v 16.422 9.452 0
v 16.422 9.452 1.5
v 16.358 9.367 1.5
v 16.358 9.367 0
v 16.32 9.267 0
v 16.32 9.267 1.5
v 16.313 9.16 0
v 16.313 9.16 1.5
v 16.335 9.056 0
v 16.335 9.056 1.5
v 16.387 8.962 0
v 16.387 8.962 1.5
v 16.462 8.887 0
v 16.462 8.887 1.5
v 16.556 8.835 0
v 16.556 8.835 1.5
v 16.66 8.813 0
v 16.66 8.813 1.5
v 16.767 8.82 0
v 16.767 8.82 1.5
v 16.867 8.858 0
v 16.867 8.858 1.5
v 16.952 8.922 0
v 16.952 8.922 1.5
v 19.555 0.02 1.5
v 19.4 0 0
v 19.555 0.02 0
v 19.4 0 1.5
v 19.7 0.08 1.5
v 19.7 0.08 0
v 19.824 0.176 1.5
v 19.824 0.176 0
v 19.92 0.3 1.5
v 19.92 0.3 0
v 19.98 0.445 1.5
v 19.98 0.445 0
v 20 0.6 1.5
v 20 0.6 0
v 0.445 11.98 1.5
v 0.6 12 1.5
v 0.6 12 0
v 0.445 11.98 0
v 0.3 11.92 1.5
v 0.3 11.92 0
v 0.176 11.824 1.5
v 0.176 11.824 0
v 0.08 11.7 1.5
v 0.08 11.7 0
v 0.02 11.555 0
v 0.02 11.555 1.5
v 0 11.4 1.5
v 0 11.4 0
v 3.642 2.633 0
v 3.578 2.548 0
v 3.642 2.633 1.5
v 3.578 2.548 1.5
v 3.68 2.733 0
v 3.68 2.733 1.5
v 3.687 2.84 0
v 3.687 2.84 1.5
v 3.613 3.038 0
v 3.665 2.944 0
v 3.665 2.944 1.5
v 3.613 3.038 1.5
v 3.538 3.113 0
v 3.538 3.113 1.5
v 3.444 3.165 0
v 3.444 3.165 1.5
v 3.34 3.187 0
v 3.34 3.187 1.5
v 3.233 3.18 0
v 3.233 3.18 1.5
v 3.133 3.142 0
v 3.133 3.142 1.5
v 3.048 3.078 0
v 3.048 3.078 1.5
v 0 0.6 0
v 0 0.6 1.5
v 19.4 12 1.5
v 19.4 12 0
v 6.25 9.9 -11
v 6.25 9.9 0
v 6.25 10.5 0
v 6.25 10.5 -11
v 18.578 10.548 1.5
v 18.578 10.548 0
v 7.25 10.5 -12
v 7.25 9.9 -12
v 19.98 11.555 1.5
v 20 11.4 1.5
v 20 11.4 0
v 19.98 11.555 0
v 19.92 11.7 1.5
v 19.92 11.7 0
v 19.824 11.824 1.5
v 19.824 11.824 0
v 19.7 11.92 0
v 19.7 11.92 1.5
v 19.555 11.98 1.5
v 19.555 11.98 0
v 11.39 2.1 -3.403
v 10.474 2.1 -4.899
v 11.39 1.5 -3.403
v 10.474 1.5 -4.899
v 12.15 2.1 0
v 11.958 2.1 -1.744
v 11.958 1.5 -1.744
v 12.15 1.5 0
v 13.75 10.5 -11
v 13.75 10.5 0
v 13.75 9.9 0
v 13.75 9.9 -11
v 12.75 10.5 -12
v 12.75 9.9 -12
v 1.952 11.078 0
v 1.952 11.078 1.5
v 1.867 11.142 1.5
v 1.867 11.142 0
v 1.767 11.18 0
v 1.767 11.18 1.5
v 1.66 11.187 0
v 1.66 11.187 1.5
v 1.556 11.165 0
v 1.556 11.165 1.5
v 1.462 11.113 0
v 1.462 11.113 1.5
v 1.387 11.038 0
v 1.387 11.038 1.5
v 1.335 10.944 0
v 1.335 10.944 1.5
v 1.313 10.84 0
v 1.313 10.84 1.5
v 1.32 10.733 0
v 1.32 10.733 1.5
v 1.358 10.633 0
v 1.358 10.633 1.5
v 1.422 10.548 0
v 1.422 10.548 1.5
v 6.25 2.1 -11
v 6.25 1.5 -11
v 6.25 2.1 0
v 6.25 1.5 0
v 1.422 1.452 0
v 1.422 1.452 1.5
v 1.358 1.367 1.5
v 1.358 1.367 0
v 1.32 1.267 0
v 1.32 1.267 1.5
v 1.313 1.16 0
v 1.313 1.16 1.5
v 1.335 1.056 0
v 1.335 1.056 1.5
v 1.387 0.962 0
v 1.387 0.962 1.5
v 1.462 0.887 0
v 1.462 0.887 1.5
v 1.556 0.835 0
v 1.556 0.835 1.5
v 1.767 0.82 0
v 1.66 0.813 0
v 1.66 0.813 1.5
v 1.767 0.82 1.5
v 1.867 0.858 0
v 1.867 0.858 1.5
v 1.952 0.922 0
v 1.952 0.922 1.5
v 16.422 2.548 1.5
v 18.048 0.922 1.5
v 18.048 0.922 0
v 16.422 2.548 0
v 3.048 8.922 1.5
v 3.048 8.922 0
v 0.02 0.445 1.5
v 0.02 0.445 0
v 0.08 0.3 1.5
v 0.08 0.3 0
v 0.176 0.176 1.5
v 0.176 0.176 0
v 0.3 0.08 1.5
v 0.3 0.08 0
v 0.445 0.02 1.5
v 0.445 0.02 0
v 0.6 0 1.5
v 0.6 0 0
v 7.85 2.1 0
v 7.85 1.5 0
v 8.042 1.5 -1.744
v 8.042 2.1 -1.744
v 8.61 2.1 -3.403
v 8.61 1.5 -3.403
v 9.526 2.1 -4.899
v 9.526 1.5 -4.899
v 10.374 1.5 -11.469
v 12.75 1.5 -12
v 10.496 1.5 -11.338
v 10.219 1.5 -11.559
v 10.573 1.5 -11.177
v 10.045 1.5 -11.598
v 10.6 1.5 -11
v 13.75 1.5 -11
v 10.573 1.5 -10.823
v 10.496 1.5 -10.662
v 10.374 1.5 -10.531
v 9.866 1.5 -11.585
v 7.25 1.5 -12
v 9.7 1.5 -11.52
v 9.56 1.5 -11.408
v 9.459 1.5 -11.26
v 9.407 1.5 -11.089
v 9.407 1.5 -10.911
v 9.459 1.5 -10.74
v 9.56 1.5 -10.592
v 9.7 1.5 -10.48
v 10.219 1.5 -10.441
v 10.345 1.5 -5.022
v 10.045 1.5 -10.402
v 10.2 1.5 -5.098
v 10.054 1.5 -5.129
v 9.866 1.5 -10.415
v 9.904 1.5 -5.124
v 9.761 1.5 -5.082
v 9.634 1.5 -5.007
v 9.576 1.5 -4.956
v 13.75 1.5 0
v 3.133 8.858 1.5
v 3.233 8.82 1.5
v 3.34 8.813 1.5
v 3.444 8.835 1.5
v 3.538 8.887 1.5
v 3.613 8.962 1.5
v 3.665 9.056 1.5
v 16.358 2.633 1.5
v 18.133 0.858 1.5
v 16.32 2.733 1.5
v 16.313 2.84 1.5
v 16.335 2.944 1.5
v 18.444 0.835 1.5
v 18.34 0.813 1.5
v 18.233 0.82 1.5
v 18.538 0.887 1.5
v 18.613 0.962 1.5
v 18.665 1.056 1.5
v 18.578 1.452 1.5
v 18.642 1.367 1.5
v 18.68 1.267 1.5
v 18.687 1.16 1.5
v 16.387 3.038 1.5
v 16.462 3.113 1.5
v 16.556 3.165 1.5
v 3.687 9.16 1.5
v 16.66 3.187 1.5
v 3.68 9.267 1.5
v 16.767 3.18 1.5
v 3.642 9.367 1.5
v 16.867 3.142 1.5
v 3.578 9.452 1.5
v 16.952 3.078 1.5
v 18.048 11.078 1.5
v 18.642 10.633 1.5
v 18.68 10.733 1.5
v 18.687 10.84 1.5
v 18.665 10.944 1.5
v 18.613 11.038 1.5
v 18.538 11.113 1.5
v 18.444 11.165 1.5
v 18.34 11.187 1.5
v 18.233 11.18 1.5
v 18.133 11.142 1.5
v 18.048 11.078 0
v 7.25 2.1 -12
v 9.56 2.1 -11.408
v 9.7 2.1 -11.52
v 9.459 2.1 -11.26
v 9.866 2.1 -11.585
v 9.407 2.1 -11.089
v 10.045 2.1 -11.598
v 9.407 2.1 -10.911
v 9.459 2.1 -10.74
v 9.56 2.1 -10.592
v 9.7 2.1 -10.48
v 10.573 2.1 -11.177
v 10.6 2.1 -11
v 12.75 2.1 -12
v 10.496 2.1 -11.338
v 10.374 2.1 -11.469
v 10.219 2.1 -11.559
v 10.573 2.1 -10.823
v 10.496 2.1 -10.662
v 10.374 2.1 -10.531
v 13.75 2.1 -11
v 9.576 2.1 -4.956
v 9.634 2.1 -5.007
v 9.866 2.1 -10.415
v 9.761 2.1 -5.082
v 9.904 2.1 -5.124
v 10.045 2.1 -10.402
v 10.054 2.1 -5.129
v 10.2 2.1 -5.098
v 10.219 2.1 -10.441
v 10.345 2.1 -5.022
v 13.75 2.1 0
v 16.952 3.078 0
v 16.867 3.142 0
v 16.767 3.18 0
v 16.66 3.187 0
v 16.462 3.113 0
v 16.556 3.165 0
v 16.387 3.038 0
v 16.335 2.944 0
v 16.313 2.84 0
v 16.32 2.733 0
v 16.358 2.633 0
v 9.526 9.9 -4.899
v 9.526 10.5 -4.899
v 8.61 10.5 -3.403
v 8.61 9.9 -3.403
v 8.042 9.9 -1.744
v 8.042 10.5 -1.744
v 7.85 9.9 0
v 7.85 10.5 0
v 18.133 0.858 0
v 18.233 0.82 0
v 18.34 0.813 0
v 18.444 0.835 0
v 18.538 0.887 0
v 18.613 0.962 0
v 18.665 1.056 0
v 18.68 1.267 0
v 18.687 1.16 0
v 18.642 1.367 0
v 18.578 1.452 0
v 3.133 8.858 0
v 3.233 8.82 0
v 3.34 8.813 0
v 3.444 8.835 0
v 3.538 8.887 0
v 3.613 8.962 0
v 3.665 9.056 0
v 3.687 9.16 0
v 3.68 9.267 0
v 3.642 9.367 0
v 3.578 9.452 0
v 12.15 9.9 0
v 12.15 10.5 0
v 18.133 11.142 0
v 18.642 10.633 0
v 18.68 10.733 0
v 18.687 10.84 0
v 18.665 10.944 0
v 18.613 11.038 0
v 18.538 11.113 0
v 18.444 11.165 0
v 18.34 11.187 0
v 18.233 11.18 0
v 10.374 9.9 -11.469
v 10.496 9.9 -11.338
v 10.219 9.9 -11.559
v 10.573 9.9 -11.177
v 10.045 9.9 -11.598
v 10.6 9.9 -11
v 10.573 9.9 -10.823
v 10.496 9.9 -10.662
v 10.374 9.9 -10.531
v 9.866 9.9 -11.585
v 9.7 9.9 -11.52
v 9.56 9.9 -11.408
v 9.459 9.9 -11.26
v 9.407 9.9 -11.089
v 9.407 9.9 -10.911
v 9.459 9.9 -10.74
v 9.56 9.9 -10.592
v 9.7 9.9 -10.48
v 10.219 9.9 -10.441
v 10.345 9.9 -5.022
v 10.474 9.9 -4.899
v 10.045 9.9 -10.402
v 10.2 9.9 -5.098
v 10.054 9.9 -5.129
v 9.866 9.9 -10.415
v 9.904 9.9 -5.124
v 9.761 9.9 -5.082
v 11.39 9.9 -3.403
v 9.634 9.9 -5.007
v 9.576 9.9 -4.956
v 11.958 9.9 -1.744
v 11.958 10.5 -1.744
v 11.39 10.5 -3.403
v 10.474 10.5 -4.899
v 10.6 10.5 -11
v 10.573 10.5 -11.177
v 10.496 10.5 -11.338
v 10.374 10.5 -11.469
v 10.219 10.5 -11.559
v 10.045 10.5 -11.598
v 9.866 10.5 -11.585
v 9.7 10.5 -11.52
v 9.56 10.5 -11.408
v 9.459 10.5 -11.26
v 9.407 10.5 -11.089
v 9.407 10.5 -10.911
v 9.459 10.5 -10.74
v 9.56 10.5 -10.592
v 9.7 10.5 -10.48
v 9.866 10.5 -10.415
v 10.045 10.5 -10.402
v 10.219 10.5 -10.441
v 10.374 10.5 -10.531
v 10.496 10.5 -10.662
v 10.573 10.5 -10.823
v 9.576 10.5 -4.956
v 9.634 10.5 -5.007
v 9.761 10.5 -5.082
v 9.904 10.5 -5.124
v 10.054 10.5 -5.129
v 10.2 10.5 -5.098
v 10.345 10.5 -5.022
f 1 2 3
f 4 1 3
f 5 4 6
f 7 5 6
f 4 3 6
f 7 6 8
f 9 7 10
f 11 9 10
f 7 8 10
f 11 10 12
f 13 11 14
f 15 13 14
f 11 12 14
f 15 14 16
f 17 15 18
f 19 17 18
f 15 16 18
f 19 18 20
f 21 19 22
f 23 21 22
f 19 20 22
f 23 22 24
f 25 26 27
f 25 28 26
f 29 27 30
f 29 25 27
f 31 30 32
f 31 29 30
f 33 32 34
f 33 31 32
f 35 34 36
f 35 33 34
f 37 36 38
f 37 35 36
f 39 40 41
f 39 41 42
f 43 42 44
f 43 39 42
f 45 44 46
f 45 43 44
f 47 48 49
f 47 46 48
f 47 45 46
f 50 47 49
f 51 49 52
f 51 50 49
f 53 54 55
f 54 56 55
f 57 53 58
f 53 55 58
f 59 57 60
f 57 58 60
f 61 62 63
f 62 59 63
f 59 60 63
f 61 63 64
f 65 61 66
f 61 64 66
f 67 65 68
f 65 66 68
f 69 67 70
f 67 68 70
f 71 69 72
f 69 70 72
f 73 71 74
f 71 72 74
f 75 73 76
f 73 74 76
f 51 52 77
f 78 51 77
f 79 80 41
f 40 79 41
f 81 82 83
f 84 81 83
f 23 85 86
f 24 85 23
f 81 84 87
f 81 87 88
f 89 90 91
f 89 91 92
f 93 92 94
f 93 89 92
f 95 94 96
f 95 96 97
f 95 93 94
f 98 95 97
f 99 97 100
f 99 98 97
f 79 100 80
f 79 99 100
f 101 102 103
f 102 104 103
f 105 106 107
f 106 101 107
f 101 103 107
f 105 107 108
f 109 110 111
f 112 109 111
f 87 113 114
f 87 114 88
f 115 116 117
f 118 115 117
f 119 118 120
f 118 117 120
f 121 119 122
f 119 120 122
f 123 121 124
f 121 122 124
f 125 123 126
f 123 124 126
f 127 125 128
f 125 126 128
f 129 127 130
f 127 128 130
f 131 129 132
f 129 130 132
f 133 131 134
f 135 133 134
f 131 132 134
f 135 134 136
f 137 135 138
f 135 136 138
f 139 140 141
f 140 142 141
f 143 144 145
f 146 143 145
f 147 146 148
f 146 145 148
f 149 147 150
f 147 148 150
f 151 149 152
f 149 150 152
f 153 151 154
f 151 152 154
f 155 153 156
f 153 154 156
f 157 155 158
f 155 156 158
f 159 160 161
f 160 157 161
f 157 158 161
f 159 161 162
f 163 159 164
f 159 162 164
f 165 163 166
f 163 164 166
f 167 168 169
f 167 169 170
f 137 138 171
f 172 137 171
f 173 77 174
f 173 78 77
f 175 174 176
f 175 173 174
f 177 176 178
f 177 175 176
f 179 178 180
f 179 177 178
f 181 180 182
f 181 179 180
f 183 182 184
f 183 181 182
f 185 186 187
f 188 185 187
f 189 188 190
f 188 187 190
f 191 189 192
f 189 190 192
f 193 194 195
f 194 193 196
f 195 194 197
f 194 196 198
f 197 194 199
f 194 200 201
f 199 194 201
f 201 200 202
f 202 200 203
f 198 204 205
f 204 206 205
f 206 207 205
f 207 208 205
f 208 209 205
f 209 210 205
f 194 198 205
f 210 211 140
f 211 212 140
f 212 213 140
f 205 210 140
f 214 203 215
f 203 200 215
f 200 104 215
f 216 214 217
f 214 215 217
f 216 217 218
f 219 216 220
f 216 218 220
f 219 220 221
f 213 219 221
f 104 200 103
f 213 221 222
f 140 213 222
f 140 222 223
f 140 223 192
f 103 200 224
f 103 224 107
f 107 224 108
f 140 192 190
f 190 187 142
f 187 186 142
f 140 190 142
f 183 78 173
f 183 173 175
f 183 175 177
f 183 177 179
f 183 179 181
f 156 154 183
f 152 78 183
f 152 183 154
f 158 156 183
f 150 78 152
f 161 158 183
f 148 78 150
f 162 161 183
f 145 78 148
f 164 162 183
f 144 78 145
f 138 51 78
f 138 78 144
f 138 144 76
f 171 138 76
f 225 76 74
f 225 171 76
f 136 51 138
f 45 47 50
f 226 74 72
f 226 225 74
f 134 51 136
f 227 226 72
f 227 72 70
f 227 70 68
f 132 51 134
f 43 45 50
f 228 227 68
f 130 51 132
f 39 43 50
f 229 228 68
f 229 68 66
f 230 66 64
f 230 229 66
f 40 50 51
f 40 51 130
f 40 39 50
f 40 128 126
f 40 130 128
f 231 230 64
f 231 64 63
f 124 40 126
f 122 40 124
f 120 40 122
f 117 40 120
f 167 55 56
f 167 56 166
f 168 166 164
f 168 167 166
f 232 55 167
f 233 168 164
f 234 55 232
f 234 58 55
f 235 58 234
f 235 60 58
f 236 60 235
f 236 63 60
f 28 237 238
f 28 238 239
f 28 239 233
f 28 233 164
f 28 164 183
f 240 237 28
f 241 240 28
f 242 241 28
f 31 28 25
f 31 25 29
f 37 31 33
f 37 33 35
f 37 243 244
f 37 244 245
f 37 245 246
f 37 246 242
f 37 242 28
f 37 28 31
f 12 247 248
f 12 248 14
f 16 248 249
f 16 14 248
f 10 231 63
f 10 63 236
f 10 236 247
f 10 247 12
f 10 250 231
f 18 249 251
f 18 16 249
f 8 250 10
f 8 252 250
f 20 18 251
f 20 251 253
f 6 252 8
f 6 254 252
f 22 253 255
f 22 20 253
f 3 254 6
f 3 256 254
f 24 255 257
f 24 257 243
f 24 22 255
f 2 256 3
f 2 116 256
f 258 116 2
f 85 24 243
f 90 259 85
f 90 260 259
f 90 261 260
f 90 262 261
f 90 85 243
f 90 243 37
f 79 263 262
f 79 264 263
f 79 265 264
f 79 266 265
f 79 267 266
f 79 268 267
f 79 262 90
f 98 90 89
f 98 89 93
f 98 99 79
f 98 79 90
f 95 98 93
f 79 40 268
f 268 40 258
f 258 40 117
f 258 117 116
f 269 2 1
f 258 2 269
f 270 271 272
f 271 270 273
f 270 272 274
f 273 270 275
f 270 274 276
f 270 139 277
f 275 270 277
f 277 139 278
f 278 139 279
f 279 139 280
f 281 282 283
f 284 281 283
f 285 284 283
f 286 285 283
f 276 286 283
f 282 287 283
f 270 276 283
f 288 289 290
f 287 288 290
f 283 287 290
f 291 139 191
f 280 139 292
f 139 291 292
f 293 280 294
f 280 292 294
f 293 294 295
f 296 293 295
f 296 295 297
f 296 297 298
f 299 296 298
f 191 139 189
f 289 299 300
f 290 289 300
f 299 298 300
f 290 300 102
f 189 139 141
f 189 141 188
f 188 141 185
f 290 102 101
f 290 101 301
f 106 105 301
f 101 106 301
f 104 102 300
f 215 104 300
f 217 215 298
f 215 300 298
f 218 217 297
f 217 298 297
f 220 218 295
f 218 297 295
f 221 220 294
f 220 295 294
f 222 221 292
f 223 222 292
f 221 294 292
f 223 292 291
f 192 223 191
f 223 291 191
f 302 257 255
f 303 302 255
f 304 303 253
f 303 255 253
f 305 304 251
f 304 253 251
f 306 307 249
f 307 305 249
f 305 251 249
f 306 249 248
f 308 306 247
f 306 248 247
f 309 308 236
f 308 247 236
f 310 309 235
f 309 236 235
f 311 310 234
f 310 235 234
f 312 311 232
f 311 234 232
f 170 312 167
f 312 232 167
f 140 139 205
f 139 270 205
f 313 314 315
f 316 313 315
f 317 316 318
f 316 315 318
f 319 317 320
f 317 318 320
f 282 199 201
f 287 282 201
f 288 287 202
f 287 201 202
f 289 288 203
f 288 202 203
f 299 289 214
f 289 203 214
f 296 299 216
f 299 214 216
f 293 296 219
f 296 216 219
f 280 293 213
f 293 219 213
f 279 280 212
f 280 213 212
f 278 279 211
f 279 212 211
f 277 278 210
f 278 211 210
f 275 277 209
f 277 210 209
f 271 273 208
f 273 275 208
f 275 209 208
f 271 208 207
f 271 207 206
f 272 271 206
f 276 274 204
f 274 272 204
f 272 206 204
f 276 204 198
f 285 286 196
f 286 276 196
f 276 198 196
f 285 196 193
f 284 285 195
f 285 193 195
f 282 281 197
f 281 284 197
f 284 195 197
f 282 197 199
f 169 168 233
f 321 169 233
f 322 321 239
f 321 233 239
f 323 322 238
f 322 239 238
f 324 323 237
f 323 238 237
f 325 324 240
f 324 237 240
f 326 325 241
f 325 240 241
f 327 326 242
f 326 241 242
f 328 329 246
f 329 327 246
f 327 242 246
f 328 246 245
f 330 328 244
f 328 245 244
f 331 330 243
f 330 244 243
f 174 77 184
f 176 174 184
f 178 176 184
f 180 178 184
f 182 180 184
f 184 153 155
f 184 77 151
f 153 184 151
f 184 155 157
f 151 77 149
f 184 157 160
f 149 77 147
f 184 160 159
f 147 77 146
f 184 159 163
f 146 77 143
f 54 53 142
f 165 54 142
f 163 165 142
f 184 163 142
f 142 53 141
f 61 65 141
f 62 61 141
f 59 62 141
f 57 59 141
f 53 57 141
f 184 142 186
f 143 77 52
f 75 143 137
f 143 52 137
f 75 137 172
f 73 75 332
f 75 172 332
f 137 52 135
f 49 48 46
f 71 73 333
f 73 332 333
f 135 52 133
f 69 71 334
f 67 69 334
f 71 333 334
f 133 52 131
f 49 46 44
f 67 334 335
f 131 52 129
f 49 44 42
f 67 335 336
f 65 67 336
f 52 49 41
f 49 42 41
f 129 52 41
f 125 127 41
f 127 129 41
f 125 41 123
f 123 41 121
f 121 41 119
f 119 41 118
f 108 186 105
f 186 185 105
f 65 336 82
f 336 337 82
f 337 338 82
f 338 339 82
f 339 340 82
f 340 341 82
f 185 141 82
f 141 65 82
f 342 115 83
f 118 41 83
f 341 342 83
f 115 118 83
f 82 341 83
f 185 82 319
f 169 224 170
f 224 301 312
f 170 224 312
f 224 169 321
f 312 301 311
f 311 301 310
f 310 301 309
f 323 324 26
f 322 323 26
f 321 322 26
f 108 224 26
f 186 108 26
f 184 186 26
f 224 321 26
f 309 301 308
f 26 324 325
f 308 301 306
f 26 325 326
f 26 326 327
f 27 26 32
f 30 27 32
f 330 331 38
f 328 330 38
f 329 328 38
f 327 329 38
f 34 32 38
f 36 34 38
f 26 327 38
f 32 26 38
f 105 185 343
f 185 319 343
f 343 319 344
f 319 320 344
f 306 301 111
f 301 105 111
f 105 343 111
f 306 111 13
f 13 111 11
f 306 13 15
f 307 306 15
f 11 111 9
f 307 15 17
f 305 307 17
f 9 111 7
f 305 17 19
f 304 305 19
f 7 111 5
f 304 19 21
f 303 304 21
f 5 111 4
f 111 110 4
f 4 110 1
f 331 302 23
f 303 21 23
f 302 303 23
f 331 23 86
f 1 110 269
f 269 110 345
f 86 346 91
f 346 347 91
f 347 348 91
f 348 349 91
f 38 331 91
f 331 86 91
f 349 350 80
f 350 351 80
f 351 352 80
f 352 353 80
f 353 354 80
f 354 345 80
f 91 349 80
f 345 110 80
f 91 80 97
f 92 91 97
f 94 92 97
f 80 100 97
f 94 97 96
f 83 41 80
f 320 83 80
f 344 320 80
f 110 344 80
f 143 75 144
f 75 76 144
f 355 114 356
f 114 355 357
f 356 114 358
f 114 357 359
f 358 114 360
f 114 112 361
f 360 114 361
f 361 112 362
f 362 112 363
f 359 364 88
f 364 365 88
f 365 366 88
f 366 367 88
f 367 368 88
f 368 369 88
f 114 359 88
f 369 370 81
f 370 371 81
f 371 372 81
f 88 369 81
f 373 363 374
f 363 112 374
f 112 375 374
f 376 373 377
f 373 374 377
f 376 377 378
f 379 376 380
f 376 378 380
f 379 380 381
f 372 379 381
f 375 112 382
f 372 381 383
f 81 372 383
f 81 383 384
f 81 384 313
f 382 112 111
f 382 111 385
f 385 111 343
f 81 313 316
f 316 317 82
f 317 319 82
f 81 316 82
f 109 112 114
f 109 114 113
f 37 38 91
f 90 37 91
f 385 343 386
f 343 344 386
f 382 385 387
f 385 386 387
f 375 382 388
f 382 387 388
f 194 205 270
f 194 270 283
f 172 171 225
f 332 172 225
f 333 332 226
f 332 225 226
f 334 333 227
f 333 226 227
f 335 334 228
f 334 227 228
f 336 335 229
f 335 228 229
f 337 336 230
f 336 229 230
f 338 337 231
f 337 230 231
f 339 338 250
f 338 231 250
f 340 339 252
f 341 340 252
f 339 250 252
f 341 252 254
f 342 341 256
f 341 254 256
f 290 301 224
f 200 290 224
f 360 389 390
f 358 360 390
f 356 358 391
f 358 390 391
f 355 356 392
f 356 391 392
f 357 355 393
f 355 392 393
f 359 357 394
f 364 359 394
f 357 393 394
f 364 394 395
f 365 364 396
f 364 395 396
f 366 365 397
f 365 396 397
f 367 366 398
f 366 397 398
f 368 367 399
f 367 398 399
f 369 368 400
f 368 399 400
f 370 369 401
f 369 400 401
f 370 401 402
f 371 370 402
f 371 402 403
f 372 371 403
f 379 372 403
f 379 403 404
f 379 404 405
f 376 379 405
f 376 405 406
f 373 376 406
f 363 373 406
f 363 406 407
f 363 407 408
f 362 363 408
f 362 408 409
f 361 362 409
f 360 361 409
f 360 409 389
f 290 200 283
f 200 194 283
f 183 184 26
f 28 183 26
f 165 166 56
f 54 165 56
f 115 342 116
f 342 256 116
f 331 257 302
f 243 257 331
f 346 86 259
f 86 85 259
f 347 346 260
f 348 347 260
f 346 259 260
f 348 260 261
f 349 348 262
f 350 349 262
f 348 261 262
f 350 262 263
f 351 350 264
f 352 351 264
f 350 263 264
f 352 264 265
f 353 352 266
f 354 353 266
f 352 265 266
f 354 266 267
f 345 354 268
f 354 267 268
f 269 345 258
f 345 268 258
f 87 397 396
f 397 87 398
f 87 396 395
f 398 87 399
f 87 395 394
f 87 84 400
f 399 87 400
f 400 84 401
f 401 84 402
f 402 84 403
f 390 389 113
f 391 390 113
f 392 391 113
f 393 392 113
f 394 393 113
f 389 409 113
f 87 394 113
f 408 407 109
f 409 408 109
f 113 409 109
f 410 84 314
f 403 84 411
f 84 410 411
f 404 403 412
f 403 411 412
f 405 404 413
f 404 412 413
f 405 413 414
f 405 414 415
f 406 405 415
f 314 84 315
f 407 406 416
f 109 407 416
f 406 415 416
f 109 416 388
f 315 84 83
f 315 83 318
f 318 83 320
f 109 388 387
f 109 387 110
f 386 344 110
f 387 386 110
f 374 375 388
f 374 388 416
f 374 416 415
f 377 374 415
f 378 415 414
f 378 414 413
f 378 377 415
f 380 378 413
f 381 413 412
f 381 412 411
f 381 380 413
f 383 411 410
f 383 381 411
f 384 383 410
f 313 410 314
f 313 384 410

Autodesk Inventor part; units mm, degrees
ref_plane "YZ Plane" through (0, 0, 0) normal (1, 0, 0) x (0, 1, 0)
sketch "Skizze1" plane through (0, 0, 0) normal (0, 0, 1) x (1, 0, 0)
  line L0 (0, 0) -> (20, 0)
  line L1 (20, 0) -> (20, 12)
  line L2 (20, 12) -> (0, 12)
  line L3 (0, 12) -> (0, 0)
  point P0 (0, 6)
  dimension "d0" = 20
  dimension "d1" = 12
extrude "Extrusion1" add sketch "Skizze1" along normal blind 1.5
sketch "Skizze2" plane through (0, 0, 1.5) normal (0, 0, 1) x (1, 0, 0)
  line L0 (1.6868, 10.8132) -> (3.3132, 9.1868) construction
  line L1 (1.4217, 10.548) -> (3.048, 8.9217)
  line L2 (3.5783, 9.452) -> (1.952, 11.0783)
  arc A0 (1.952, 11.0783) -> (1.4217, 10.548) centre (1.6868, 10.8132) ccw
  arc A1 (3.048, 8.9217) -> (3.5783, 9.452) centre (3.3132, 9.1868) ccw
  line L3 (0, 12) -> (0, 0) projected
  line L4 (18.3132, 10.8132) -> (16.6868, 9.1868) construction
  line L5 (18.5783, 10.548) -> (16.952, 8.9217)
  line L6 (16.4217, 9.452) -> (18.048, 11.0783)
  arc A2 (18.5783, 10.548) -> (18.048, 11.0783) centre (18.3132, 10.8132) ccw
  arc A3 (16.4217, 9.452) -> (16.952, 8.9217) centre (16.6868, 9.1868) ccw
  line L7 (20, 0) -> (20, 12) projected
  line L8 (0, 0) -> (20, 0) projected
  line L9 (10, 0) -> (10, 12) construction
  line L10 (20, 12) -> (0, 12) projected
  point P0 (2.5, 10)
  point P1 (17.5, 10)
  dimension "d7" = 15
  dimension "d8" = 7.5
  dimension "d9" = 0.75
  dimension "d10" = 2
  dimension "d11" = 2.3
  dimension "d12" = 45
extrude "Extrusion2" cut sketch "Skizze2" against normal up to surface (1.5 mm away) contours A0 L2 A1 L1 | L5 A3 L6 A2
ref_plane "Arbeitsebene1" through (0, 6, 0) normal (0, 1, 0) x (-1, 0, 0)
mirror "Spiegeln1" about plane through (0, 6, 0) normal (0, 1, 0) of "Extrusion2"
sketch "Skizze3" plane through (0, 0, 0) normal (0, 0, -1) x (-1, 0, 0)
  line L0 (-20, 12) -> (0, 12) projected
  line L1 (-10, 12) -> (-10, 0) construction
  line L2 (0, 0) -> (-20, 0) projected
  line L3 (-6.25, 10.5) -> (-13.75, 10.5)
  line L4 (-13.75, 10.5) -> (-13.75, 9.9)
  line L5 (-13.75, 9.9) -> (-6.25, 9.9)
  line L6 (-6.25, 9.9) -> (-6.25, 10.5)
  dimension "d16" = 1.5
  dimension "d17" = 7.5
  dimension "d18" = 0.6
extrude "Extrusion3" add sketch "Skizze3" along normal blind 12
chamfer "Fasen1" distance 1 angle 45 2 edges at (13.75, 10.2, -12) (6.25, 10.2, -12)
sketch "Skizze4" plane through (6.25, 10.5, 0) normal (0, 1, 0) x (1, 0, 0)
  line L0 (7.5, 0) -> (0, 0) projected
  line L1 (3.75, 0) -> (3.75, 5.4569) construction
  arc A0 (5.9, 0) -> (3.75, 5.4569) centre (-2.1, 0) ccw
  arc A1 (3.75, 5.4569) -> (1.6, 0) centre (9.6, 0) ccw
  line L2 (13.75, 0) -> (-6.25, 0) projected
  line L3 (7.5, 0) -> (7.5, 11) projected
  dimension "d24" = 8
  dimension "d25" = 1.6
extrude "Extrusion4" cut sketch "Skizze4" against normal up to surface (0.6 mm away)
fillet "Rundung1" radius 0.6 1 edges at (10, 10.2, -5.4569)
sketch "Skizze5" plane through (7.25, 10.5, -12) normal (0, 1, 0) x (1, 0, 0)
  circle A0 centre (2.75, -1) radius 0.6
  line L0 (0, 0) -> (5.5, 0) projected
  line L1 (-1, -12) -> (-1, -1) projected
  point P0 (-7.25, -12)
  point P1 (2.75, 0)
  dimension "d30" = 1
  dimension "d31" = 1.2
extrude "Extrusion5" cut sketch "Skizze5" against normal up to surface (0.6 mm away)
ref_plane "Arbeitsebene2" through (0, 6, 0) normal (0, 1, 0) x (-1, 0, 0)
mirror "Spiegeln2" about plane through (0, 6, 0) normal (0, 1, 0) of "Extrusion3", "Extrusion4", "Extrusion5", "Fasen1", "Rundung1"
fillet "Rundung2" radius 0.6 4 edges at (20, 12, 0.75) (0, 12, 0.75) (0, 0, 0.75) (20, 0, 0.75)
properties part number "Koerper" material "Stahl, galvanisiert"
